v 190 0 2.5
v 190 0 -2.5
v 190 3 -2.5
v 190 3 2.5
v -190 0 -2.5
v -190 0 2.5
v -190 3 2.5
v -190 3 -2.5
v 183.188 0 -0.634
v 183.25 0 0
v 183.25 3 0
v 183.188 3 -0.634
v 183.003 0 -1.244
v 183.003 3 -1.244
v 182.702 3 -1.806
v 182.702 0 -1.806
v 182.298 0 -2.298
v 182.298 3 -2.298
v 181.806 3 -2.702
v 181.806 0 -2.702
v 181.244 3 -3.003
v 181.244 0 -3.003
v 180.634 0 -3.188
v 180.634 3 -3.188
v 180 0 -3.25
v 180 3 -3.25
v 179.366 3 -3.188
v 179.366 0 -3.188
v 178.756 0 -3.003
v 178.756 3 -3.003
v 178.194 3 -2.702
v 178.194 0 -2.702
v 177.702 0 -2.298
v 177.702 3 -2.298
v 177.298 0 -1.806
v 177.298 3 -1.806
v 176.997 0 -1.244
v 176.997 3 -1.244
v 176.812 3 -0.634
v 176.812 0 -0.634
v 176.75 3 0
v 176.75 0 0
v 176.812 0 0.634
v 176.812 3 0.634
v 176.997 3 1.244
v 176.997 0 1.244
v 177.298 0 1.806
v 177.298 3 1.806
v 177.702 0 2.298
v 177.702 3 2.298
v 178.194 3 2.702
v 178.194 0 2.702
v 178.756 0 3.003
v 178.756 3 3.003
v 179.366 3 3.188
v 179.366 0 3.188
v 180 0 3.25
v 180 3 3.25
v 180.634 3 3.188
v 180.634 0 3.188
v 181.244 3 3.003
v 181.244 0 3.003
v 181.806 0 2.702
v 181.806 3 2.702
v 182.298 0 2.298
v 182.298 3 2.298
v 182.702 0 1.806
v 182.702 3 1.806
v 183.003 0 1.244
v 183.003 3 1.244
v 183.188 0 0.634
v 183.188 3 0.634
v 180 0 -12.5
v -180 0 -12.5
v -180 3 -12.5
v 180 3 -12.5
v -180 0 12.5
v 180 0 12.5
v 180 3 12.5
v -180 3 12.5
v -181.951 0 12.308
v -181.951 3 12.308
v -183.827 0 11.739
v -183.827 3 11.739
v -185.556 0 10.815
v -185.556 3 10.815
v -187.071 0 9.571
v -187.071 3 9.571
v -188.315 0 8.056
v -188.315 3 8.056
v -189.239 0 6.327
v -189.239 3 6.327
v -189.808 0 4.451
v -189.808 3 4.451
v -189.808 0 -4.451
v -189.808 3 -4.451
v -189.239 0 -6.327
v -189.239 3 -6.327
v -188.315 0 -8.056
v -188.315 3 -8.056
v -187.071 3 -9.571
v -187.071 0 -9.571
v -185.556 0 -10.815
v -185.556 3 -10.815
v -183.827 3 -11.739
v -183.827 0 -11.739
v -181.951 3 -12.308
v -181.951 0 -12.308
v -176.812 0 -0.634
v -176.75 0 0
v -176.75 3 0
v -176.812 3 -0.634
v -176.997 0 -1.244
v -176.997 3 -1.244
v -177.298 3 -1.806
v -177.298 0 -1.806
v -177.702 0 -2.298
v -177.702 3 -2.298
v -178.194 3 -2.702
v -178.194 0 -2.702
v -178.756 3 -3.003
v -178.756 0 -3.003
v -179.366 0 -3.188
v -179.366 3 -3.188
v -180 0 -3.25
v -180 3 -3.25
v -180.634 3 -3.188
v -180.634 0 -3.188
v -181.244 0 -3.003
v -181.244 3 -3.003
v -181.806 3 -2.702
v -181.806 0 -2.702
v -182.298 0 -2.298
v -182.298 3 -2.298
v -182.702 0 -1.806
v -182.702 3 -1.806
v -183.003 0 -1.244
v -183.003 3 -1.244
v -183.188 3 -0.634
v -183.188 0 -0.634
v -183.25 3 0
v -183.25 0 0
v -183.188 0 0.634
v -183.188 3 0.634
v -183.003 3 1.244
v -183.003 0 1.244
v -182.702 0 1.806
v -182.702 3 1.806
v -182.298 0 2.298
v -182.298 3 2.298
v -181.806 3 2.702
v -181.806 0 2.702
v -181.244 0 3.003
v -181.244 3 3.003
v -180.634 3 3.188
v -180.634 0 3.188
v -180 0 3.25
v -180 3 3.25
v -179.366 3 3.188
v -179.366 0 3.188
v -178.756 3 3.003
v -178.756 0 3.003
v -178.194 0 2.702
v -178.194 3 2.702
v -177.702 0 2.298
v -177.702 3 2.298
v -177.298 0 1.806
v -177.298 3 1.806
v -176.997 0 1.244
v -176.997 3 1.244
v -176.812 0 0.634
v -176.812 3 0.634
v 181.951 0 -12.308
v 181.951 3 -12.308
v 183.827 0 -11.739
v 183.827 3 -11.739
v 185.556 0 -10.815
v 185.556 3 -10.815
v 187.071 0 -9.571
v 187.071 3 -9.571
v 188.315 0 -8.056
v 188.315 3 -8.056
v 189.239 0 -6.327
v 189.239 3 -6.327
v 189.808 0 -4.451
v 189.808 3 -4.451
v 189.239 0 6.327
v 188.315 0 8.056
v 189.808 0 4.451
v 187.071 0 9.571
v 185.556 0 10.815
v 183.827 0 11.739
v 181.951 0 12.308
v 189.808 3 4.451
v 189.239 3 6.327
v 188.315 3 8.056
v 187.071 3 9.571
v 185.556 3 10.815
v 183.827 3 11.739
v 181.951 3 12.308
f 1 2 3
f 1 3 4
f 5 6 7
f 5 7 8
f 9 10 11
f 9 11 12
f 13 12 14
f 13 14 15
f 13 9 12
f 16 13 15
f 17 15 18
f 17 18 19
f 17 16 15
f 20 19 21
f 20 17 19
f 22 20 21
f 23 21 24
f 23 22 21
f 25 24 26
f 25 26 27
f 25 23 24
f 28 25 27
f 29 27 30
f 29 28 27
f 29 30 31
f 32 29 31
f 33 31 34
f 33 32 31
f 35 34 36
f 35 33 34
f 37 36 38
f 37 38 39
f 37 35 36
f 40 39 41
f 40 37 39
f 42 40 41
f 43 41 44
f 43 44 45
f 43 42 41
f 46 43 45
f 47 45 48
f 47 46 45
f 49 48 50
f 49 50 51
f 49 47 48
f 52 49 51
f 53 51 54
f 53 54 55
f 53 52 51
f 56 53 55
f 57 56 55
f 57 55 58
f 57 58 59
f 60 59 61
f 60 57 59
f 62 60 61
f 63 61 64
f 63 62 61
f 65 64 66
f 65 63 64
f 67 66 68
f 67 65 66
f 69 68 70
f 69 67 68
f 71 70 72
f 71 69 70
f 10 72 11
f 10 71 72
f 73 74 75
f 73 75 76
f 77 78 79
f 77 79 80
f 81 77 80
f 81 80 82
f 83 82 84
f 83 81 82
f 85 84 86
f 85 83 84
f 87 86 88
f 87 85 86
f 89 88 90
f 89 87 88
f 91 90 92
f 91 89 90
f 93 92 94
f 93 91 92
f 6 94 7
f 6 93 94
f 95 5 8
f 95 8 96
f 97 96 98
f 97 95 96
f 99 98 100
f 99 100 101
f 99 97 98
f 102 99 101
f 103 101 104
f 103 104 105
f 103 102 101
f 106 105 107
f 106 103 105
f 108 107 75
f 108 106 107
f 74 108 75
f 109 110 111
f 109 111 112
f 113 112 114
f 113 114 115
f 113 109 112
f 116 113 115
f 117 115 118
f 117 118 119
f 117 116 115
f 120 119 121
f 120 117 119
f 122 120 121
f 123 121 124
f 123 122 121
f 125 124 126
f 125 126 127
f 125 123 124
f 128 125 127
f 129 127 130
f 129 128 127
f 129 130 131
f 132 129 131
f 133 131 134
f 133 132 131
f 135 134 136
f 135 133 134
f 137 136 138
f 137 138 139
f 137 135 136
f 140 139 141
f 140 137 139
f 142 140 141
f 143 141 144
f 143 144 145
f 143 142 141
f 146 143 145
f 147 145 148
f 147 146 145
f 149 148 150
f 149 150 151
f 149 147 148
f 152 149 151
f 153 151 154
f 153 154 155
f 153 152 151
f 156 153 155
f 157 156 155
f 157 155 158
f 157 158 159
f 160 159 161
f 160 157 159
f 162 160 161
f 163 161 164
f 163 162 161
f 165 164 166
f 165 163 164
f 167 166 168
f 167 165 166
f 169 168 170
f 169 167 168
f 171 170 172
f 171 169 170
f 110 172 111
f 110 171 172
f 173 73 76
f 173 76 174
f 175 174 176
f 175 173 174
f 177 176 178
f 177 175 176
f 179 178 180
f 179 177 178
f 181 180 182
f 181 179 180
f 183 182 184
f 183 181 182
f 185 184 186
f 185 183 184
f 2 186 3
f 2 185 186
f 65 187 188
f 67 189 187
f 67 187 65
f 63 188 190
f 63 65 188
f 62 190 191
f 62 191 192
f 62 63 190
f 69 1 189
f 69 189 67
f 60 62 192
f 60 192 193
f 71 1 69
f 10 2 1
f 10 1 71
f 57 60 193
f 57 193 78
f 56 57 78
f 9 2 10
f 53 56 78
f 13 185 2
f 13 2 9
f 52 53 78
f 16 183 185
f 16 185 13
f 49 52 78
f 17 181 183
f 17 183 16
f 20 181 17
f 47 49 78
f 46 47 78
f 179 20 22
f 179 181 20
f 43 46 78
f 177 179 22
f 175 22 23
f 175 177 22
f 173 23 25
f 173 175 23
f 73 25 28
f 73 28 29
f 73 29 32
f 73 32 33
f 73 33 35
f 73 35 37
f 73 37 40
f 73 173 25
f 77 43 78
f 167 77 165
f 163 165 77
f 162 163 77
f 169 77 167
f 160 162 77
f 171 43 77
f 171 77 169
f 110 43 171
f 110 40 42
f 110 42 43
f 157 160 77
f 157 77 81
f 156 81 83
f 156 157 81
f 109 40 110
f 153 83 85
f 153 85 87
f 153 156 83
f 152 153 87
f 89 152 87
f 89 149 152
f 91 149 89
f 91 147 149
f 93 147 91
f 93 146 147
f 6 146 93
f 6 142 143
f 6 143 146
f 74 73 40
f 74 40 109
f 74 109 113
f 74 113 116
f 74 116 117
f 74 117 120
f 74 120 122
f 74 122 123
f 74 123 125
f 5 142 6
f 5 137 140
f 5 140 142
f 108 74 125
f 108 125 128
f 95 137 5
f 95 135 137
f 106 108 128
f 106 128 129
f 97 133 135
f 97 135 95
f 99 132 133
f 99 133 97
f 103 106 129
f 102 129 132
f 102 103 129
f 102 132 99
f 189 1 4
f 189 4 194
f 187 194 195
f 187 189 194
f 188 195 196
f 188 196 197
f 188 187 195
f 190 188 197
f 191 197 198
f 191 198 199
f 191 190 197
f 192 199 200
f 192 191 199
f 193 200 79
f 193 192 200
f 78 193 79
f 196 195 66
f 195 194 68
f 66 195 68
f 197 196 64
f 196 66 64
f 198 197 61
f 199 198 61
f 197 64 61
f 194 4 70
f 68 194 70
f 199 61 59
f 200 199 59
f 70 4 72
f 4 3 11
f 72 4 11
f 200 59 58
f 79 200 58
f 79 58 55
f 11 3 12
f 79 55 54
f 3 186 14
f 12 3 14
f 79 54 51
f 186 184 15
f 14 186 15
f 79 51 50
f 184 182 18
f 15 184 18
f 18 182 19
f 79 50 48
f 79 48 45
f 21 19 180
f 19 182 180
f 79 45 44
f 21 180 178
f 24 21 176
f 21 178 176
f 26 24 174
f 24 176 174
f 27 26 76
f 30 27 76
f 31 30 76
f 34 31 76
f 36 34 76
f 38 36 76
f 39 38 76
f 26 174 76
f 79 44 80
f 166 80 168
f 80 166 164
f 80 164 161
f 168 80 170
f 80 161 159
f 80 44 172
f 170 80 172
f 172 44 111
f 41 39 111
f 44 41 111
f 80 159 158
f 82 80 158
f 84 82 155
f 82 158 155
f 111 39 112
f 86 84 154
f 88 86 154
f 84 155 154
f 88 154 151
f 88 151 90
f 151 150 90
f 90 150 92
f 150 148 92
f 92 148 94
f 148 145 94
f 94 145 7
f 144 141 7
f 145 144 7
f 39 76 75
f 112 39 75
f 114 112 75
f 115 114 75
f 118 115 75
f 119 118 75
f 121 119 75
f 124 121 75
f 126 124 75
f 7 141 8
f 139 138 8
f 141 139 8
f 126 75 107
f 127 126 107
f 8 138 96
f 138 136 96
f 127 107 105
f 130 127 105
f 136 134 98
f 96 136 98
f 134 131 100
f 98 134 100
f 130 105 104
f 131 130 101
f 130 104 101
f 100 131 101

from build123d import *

# Parameters (mm, degrees)
SKETCH1_R           = 3.25
BOSS_EXTRUDE1_DEPTH = 3


with BuildPart() as part:
    # Sketch1 → Boss-Extrude1 (new body)
    with BuildSketch(Plane(origin=(0, 0, 0), x_dir=(1, 0, 0), z_dir=(0, 1, 0))):
        with BuildLine():
            Line((-180, 12.5), (180, 12.5))
            ThreePointArc((180, 12.5), (187.071067812, 9.571067812), (190, 2.5))
            Line((190, 2.5), (190, -2.5))
            ThreePointArc((190, -2.5), (187.071067812, -9.571067812), (180, -12.5))
            Line((180, -12.5), (-180, -12.5))
            ThreePointArc((-180, -12.5), (-187.071067812, -9.571067812), (-190, -2.5))
            Line((-190, -2.5), (-190, 2.5))
            ThreePointArc((-190, 2.5), (-187.071067812, 9.571067812), (-180, 12.5))
        make_face()
        with Locations((-180, 0)):
            Circle(SKETCH1_R, mode=Mode.SUBTRACT)
        with Locations((180, 0)):
            Circle(SKETCH1_R, mode=Mode.SUBTRACT)
    extrude(amount=BOSS_EXTRUDE1_DEPTH)


solid = part.part
